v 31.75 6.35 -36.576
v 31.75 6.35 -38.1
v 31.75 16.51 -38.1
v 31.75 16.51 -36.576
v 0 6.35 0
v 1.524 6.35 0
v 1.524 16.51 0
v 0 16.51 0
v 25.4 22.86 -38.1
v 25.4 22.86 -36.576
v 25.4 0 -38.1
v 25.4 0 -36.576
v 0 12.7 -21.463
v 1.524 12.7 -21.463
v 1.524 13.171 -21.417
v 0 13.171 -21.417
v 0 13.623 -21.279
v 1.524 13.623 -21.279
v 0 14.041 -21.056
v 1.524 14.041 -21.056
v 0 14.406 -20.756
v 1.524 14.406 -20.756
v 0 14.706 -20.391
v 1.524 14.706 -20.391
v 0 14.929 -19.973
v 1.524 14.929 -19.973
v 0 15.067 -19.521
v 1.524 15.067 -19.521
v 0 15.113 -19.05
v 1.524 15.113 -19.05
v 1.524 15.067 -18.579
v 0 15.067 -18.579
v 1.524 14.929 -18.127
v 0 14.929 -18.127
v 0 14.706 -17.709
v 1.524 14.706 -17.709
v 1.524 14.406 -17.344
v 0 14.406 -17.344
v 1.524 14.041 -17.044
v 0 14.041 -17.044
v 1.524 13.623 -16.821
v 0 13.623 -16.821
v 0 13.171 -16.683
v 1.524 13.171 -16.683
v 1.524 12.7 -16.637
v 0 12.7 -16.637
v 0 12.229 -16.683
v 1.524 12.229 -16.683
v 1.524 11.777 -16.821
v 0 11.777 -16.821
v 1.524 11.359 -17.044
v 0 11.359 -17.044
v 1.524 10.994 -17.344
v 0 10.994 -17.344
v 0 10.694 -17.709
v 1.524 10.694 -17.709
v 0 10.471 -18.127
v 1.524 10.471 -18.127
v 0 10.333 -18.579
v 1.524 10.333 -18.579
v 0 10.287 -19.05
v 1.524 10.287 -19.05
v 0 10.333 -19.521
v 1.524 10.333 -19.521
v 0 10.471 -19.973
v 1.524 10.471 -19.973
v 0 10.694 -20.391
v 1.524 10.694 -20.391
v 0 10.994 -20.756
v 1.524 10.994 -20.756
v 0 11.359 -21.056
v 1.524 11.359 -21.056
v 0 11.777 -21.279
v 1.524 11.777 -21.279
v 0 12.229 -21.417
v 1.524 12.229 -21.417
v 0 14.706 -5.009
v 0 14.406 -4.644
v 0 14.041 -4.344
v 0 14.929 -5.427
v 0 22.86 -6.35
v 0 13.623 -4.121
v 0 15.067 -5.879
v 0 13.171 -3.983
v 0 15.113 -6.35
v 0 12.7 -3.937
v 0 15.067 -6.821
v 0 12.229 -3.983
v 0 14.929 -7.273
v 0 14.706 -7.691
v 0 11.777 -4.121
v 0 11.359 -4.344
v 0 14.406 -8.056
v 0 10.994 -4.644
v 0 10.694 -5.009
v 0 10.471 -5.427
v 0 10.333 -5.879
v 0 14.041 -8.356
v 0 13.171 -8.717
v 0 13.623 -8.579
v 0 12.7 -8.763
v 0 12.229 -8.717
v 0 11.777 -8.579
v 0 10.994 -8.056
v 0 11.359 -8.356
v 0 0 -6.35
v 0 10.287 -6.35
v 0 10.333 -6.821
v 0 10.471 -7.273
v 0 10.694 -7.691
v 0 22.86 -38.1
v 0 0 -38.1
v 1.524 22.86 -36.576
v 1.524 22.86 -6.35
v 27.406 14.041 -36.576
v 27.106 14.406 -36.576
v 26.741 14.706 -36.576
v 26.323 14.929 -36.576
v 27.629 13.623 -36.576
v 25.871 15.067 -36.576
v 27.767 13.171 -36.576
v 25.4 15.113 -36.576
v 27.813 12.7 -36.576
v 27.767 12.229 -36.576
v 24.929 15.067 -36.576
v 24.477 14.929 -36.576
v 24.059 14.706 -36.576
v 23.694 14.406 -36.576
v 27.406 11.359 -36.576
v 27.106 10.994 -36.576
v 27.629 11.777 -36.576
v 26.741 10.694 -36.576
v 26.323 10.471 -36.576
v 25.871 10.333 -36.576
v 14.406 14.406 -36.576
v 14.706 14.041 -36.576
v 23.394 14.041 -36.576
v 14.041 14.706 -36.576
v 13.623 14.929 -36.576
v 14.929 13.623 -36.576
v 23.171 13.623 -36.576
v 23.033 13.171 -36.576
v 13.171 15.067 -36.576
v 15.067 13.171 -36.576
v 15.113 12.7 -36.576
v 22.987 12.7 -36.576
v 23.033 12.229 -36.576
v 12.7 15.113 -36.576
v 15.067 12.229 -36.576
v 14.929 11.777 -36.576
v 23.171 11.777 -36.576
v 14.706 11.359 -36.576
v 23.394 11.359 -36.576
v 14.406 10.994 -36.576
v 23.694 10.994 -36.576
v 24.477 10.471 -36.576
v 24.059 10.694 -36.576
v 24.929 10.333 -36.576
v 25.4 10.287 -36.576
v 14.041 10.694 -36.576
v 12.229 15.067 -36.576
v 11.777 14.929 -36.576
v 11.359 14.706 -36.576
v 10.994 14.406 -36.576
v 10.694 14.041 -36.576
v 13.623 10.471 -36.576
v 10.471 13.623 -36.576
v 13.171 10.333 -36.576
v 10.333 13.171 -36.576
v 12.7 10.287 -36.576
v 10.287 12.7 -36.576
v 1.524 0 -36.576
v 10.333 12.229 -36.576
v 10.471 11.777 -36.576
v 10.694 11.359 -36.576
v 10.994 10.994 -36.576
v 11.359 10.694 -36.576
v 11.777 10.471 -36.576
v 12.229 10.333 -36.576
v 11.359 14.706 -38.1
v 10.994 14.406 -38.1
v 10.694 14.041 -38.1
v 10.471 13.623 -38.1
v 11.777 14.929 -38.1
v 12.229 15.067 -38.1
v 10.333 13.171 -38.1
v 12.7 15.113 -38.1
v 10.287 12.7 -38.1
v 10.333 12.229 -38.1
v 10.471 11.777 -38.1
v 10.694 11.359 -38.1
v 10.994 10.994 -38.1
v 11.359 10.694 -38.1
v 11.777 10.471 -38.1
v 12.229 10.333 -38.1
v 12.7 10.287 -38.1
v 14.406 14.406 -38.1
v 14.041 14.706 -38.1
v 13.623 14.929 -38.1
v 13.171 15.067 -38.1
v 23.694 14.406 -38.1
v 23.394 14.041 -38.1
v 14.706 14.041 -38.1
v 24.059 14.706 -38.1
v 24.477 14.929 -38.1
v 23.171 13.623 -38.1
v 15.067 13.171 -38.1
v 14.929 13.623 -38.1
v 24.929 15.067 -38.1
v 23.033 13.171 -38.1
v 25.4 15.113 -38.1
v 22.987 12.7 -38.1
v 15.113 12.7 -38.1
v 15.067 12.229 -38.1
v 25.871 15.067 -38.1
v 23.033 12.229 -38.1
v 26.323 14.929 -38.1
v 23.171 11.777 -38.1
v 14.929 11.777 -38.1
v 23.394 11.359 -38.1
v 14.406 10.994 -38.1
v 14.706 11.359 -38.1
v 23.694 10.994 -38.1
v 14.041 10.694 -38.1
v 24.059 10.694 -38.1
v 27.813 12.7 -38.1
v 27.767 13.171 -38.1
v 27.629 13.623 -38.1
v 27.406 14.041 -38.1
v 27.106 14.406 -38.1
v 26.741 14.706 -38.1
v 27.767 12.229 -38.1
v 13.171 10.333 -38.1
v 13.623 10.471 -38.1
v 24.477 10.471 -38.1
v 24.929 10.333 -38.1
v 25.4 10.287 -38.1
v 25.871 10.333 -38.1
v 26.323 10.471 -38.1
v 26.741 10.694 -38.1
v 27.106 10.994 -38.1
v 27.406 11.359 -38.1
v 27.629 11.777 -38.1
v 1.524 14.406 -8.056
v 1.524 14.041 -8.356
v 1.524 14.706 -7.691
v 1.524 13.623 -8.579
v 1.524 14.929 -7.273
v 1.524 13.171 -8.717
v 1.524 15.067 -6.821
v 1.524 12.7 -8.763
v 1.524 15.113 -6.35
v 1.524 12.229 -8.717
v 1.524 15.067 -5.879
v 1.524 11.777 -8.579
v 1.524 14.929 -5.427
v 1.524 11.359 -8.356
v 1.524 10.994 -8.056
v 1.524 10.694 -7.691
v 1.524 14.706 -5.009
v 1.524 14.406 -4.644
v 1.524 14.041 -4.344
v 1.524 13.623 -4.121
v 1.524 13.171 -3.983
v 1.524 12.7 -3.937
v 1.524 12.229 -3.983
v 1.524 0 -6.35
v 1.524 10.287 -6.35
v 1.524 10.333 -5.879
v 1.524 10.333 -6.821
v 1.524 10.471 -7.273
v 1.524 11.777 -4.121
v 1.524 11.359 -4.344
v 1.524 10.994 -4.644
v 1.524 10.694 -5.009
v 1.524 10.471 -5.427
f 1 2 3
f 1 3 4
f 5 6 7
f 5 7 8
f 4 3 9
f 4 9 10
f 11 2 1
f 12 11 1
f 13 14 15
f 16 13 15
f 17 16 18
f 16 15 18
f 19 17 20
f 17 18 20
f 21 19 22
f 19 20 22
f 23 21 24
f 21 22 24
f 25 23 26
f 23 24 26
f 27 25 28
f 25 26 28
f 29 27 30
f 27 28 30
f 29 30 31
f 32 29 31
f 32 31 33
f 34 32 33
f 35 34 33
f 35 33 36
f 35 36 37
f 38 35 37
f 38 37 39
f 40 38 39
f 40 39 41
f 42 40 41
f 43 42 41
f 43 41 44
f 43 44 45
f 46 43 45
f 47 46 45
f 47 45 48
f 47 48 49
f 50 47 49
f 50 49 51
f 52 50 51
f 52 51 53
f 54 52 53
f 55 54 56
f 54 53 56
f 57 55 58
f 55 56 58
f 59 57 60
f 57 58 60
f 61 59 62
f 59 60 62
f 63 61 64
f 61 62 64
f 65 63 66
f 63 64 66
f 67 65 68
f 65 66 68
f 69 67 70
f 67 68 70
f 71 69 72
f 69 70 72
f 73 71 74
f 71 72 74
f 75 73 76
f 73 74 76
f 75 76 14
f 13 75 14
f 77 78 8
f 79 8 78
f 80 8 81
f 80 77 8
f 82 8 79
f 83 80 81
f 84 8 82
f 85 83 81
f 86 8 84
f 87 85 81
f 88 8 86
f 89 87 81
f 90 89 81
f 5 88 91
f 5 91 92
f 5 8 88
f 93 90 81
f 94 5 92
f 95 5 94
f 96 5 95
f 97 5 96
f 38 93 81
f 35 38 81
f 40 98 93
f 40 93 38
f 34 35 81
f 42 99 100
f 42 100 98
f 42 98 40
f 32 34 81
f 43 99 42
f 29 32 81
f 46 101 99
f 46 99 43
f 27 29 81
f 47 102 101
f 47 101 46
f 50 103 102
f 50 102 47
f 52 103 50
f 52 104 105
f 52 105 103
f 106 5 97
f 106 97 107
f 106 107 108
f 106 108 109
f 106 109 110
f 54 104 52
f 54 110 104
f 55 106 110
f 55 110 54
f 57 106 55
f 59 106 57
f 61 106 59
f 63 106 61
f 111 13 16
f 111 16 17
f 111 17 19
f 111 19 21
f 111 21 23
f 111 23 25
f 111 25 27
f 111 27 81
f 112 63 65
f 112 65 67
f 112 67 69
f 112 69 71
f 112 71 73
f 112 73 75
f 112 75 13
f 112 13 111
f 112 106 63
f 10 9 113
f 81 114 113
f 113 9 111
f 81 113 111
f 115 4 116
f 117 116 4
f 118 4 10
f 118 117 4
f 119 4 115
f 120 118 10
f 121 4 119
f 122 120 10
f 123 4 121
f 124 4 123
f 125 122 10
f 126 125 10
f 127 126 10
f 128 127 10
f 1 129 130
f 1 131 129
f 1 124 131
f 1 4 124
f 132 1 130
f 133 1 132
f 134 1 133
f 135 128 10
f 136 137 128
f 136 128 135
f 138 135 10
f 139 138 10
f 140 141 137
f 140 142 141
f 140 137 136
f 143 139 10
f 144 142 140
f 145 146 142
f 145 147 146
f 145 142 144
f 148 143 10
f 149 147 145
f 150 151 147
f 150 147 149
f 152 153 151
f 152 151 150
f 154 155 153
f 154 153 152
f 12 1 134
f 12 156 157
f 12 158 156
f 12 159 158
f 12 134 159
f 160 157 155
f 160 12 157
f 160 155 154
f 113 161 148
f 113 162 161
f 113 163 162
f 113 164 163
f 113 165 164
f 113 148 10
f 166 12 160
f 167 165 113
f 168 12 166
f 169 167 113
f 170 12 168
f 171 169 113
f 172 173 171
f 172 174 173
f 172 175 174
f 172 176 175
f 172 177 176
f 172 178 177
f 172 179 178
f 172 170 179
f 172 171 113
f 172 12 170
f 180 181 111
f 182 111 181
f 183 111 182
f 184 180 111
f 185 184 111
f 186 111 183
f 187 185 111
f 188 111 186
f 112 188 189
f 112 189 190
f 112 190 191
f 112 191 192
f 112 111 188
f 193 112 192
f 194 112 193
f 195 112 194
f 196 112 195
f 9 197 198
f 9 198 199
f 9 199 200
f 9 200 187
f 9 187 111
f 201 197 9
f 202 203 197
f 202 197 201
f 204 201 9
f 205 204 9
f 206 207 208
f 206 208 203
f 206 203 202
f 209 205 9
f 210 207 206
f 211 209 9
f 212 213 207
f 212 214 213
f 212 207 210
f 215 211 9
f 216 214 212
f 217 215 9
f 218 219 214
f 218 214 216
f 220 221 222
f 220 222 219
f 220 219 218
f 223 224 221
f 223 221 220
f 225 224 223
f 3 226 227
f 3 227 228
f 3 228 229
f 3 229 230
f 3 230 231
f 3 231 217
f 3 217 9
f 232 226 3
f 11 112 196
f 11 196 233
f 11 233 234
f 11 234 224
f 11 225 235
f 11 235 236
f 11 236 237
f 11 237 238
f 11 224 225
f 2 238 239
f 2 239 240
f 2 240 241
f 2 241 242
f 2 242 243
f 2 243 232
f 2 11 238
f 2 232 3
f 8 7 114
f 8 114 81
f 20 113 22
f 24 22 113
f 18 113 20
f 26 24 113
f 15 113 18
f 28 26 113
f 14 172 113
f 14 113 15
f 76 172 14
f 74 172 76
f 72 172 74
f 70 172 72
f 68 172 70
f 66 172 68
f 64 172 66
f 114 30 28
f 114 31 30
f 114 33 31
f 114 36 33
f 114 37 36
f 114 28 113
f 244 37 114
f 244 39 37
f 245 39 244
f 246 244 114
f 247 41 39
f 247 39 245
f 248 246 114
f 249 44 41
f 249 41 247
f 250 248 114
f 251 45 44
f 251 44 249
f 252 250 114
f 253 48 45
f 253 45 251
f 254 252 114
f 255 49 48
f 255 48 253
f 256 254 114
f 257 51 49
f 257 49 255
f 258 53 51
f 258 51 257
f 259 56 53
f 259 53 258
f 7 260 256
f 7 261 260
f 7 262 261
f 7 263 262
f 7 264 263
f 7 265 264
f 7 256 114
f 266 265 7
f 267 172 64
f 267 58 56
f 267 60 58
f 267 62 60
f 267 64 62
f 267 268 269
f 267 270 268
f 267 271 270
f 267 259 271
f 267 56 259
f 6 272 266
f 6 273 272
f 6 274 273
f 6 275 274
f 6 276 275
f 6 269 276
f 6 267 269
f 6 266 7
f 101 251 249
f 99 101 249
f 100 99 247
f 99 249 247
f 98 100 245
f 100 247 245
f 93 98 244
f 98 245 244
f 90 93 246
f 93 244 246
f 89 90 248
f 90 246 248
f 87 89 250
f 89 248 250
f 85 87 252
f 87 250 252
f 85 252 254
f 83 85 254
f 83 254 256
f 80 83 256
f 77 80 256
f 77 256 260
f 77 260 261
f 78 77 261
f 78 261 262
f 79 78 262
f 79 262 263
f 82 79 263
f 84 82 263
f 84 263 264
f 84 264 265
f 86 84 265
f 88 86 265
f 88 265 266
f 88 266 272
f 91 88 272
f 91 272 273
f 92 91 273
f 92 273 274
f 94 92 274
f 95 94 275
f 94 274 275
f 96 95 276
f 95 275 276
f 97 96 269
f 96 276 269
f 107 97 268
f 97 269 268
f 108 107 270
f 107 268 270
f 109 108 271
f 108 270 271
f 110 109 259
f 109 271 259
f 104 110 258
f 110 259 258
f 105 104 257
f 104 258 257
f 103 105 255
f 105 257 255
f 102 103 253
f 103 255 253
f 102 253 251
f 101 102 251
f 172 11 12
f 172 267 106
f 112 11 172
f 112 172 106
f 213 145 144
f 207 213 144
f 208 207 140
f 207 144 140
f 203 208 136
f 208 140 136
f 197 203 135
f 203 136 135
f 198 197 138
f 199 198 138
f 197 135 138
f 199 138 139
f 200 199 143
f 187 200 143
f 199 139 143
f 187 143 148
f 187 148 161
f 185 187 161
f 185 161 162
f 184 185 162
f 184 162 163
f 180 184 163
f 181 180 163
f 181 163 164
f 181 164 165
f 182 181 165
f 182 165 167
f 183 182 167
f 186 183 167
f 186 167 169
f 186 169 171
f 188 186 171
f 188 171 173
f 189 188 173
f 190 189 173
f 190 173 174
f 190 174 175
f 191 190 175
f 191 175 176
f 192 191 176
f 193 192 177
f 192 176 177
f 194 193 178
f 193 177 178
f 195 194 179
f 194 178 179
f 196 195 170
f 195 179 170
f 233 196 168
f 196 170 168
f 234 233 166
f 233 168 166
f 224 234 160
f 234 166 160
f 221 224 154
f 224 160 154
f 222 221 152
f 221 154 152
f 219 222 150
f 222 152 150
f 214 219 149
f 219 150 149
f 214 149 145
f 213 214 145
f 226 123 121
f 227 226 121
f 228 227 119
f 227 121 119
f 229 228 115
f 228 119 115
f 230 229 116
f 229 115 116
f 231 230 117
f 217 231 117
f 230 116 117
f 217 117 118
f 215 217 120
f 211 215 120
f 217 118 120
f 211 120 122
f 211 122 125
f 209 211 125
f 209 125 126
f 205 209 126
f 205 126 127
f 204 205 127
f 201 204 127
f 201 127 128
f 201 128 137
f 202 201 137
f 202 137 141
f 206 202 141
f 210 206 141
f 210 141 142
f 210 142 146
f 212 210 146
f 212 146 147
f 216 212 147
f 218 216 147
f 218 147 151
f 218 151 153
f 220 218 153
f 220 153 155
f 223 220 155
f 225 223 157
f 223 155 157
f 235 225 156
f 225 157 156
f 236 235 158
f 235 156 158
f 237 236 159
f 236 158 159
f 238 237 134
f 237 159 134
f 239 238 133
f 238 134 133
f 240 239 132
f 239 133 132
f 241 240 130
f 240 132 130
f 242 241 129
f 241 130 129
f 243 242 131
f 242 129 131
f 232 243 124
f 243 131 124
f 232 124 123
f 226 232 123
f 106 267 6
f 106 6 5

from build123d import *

# Parameters (mm, degrees)
BOSS_EXTRUDE1_DEPTH = 22.86
SKETCH2_R           = 2.413
CUT_EXTRUDE1_DEPTH  = 54.73826082
SKETCH3_R           = 2.413
CUT_EXTRUDE2_DEPTH  = 54.55787408
CHAMFER1_SIZE       = 6.35


with BuildPart() as part:
    # Sketch1 → Boss-Extrude1 (new body)
    with BuildSketch(Plane(origin=(0, 0, 0), x_dir=(1, 0, 0), z_dir=(0, 1, 0))):
        Polygon((0, 0), (0, 38.1), (31.75, 38.1), (31.75, 36.576), (1.524, 36.576), (1.524, 0), align=None)
    extrude(amount=BOSS_EXTRUDE1_DEPTH)

    # Sketch2 → Cut-Extrude1 (cut, through all)
    with BuildSketch(Plane(origin=(1.524, 0, 0), x_dir=(0, 0, -1), z_dir=(1, 0, 0))):
        with Locations((6.35, 12.7)):
            Circle(SKETCH2_R)
        with Locations((19.05, 12.7)):
            Circle(SKETCH2_R)
    extrude(amount=-CUT_EXTRUDE1_DEPTH, mode=Mode.SUBTRACT)

    # Sketch3 → Cut-Extrude2 (cut, through all)
    with BuildSketch(Plane.XY.offset(-36.576)):
        with Locations((25.4, 12.7)):
            Circle(SKETCH3_R)
        with Locations((12.7, 12.7)):
            Circle(SKETCH3_R)
    extrude(amount=-CUT_EXTRUDE2_DEPTH, mode=Mode.SUBTRACT)

    # Chamfer1
    chamfer1_edges = [part.edges().sort_by_distance(p)[0] for p in [
        (31.75, 22.86, -37.338),
        (0.762, 22.86, 0),
        (31.75, 0, -37.338),
        (0.762, 0, 0),
    ]]
    chamfer(chamfer1_edges, length=CHAMFER1_SIZE)


solid = part.part
